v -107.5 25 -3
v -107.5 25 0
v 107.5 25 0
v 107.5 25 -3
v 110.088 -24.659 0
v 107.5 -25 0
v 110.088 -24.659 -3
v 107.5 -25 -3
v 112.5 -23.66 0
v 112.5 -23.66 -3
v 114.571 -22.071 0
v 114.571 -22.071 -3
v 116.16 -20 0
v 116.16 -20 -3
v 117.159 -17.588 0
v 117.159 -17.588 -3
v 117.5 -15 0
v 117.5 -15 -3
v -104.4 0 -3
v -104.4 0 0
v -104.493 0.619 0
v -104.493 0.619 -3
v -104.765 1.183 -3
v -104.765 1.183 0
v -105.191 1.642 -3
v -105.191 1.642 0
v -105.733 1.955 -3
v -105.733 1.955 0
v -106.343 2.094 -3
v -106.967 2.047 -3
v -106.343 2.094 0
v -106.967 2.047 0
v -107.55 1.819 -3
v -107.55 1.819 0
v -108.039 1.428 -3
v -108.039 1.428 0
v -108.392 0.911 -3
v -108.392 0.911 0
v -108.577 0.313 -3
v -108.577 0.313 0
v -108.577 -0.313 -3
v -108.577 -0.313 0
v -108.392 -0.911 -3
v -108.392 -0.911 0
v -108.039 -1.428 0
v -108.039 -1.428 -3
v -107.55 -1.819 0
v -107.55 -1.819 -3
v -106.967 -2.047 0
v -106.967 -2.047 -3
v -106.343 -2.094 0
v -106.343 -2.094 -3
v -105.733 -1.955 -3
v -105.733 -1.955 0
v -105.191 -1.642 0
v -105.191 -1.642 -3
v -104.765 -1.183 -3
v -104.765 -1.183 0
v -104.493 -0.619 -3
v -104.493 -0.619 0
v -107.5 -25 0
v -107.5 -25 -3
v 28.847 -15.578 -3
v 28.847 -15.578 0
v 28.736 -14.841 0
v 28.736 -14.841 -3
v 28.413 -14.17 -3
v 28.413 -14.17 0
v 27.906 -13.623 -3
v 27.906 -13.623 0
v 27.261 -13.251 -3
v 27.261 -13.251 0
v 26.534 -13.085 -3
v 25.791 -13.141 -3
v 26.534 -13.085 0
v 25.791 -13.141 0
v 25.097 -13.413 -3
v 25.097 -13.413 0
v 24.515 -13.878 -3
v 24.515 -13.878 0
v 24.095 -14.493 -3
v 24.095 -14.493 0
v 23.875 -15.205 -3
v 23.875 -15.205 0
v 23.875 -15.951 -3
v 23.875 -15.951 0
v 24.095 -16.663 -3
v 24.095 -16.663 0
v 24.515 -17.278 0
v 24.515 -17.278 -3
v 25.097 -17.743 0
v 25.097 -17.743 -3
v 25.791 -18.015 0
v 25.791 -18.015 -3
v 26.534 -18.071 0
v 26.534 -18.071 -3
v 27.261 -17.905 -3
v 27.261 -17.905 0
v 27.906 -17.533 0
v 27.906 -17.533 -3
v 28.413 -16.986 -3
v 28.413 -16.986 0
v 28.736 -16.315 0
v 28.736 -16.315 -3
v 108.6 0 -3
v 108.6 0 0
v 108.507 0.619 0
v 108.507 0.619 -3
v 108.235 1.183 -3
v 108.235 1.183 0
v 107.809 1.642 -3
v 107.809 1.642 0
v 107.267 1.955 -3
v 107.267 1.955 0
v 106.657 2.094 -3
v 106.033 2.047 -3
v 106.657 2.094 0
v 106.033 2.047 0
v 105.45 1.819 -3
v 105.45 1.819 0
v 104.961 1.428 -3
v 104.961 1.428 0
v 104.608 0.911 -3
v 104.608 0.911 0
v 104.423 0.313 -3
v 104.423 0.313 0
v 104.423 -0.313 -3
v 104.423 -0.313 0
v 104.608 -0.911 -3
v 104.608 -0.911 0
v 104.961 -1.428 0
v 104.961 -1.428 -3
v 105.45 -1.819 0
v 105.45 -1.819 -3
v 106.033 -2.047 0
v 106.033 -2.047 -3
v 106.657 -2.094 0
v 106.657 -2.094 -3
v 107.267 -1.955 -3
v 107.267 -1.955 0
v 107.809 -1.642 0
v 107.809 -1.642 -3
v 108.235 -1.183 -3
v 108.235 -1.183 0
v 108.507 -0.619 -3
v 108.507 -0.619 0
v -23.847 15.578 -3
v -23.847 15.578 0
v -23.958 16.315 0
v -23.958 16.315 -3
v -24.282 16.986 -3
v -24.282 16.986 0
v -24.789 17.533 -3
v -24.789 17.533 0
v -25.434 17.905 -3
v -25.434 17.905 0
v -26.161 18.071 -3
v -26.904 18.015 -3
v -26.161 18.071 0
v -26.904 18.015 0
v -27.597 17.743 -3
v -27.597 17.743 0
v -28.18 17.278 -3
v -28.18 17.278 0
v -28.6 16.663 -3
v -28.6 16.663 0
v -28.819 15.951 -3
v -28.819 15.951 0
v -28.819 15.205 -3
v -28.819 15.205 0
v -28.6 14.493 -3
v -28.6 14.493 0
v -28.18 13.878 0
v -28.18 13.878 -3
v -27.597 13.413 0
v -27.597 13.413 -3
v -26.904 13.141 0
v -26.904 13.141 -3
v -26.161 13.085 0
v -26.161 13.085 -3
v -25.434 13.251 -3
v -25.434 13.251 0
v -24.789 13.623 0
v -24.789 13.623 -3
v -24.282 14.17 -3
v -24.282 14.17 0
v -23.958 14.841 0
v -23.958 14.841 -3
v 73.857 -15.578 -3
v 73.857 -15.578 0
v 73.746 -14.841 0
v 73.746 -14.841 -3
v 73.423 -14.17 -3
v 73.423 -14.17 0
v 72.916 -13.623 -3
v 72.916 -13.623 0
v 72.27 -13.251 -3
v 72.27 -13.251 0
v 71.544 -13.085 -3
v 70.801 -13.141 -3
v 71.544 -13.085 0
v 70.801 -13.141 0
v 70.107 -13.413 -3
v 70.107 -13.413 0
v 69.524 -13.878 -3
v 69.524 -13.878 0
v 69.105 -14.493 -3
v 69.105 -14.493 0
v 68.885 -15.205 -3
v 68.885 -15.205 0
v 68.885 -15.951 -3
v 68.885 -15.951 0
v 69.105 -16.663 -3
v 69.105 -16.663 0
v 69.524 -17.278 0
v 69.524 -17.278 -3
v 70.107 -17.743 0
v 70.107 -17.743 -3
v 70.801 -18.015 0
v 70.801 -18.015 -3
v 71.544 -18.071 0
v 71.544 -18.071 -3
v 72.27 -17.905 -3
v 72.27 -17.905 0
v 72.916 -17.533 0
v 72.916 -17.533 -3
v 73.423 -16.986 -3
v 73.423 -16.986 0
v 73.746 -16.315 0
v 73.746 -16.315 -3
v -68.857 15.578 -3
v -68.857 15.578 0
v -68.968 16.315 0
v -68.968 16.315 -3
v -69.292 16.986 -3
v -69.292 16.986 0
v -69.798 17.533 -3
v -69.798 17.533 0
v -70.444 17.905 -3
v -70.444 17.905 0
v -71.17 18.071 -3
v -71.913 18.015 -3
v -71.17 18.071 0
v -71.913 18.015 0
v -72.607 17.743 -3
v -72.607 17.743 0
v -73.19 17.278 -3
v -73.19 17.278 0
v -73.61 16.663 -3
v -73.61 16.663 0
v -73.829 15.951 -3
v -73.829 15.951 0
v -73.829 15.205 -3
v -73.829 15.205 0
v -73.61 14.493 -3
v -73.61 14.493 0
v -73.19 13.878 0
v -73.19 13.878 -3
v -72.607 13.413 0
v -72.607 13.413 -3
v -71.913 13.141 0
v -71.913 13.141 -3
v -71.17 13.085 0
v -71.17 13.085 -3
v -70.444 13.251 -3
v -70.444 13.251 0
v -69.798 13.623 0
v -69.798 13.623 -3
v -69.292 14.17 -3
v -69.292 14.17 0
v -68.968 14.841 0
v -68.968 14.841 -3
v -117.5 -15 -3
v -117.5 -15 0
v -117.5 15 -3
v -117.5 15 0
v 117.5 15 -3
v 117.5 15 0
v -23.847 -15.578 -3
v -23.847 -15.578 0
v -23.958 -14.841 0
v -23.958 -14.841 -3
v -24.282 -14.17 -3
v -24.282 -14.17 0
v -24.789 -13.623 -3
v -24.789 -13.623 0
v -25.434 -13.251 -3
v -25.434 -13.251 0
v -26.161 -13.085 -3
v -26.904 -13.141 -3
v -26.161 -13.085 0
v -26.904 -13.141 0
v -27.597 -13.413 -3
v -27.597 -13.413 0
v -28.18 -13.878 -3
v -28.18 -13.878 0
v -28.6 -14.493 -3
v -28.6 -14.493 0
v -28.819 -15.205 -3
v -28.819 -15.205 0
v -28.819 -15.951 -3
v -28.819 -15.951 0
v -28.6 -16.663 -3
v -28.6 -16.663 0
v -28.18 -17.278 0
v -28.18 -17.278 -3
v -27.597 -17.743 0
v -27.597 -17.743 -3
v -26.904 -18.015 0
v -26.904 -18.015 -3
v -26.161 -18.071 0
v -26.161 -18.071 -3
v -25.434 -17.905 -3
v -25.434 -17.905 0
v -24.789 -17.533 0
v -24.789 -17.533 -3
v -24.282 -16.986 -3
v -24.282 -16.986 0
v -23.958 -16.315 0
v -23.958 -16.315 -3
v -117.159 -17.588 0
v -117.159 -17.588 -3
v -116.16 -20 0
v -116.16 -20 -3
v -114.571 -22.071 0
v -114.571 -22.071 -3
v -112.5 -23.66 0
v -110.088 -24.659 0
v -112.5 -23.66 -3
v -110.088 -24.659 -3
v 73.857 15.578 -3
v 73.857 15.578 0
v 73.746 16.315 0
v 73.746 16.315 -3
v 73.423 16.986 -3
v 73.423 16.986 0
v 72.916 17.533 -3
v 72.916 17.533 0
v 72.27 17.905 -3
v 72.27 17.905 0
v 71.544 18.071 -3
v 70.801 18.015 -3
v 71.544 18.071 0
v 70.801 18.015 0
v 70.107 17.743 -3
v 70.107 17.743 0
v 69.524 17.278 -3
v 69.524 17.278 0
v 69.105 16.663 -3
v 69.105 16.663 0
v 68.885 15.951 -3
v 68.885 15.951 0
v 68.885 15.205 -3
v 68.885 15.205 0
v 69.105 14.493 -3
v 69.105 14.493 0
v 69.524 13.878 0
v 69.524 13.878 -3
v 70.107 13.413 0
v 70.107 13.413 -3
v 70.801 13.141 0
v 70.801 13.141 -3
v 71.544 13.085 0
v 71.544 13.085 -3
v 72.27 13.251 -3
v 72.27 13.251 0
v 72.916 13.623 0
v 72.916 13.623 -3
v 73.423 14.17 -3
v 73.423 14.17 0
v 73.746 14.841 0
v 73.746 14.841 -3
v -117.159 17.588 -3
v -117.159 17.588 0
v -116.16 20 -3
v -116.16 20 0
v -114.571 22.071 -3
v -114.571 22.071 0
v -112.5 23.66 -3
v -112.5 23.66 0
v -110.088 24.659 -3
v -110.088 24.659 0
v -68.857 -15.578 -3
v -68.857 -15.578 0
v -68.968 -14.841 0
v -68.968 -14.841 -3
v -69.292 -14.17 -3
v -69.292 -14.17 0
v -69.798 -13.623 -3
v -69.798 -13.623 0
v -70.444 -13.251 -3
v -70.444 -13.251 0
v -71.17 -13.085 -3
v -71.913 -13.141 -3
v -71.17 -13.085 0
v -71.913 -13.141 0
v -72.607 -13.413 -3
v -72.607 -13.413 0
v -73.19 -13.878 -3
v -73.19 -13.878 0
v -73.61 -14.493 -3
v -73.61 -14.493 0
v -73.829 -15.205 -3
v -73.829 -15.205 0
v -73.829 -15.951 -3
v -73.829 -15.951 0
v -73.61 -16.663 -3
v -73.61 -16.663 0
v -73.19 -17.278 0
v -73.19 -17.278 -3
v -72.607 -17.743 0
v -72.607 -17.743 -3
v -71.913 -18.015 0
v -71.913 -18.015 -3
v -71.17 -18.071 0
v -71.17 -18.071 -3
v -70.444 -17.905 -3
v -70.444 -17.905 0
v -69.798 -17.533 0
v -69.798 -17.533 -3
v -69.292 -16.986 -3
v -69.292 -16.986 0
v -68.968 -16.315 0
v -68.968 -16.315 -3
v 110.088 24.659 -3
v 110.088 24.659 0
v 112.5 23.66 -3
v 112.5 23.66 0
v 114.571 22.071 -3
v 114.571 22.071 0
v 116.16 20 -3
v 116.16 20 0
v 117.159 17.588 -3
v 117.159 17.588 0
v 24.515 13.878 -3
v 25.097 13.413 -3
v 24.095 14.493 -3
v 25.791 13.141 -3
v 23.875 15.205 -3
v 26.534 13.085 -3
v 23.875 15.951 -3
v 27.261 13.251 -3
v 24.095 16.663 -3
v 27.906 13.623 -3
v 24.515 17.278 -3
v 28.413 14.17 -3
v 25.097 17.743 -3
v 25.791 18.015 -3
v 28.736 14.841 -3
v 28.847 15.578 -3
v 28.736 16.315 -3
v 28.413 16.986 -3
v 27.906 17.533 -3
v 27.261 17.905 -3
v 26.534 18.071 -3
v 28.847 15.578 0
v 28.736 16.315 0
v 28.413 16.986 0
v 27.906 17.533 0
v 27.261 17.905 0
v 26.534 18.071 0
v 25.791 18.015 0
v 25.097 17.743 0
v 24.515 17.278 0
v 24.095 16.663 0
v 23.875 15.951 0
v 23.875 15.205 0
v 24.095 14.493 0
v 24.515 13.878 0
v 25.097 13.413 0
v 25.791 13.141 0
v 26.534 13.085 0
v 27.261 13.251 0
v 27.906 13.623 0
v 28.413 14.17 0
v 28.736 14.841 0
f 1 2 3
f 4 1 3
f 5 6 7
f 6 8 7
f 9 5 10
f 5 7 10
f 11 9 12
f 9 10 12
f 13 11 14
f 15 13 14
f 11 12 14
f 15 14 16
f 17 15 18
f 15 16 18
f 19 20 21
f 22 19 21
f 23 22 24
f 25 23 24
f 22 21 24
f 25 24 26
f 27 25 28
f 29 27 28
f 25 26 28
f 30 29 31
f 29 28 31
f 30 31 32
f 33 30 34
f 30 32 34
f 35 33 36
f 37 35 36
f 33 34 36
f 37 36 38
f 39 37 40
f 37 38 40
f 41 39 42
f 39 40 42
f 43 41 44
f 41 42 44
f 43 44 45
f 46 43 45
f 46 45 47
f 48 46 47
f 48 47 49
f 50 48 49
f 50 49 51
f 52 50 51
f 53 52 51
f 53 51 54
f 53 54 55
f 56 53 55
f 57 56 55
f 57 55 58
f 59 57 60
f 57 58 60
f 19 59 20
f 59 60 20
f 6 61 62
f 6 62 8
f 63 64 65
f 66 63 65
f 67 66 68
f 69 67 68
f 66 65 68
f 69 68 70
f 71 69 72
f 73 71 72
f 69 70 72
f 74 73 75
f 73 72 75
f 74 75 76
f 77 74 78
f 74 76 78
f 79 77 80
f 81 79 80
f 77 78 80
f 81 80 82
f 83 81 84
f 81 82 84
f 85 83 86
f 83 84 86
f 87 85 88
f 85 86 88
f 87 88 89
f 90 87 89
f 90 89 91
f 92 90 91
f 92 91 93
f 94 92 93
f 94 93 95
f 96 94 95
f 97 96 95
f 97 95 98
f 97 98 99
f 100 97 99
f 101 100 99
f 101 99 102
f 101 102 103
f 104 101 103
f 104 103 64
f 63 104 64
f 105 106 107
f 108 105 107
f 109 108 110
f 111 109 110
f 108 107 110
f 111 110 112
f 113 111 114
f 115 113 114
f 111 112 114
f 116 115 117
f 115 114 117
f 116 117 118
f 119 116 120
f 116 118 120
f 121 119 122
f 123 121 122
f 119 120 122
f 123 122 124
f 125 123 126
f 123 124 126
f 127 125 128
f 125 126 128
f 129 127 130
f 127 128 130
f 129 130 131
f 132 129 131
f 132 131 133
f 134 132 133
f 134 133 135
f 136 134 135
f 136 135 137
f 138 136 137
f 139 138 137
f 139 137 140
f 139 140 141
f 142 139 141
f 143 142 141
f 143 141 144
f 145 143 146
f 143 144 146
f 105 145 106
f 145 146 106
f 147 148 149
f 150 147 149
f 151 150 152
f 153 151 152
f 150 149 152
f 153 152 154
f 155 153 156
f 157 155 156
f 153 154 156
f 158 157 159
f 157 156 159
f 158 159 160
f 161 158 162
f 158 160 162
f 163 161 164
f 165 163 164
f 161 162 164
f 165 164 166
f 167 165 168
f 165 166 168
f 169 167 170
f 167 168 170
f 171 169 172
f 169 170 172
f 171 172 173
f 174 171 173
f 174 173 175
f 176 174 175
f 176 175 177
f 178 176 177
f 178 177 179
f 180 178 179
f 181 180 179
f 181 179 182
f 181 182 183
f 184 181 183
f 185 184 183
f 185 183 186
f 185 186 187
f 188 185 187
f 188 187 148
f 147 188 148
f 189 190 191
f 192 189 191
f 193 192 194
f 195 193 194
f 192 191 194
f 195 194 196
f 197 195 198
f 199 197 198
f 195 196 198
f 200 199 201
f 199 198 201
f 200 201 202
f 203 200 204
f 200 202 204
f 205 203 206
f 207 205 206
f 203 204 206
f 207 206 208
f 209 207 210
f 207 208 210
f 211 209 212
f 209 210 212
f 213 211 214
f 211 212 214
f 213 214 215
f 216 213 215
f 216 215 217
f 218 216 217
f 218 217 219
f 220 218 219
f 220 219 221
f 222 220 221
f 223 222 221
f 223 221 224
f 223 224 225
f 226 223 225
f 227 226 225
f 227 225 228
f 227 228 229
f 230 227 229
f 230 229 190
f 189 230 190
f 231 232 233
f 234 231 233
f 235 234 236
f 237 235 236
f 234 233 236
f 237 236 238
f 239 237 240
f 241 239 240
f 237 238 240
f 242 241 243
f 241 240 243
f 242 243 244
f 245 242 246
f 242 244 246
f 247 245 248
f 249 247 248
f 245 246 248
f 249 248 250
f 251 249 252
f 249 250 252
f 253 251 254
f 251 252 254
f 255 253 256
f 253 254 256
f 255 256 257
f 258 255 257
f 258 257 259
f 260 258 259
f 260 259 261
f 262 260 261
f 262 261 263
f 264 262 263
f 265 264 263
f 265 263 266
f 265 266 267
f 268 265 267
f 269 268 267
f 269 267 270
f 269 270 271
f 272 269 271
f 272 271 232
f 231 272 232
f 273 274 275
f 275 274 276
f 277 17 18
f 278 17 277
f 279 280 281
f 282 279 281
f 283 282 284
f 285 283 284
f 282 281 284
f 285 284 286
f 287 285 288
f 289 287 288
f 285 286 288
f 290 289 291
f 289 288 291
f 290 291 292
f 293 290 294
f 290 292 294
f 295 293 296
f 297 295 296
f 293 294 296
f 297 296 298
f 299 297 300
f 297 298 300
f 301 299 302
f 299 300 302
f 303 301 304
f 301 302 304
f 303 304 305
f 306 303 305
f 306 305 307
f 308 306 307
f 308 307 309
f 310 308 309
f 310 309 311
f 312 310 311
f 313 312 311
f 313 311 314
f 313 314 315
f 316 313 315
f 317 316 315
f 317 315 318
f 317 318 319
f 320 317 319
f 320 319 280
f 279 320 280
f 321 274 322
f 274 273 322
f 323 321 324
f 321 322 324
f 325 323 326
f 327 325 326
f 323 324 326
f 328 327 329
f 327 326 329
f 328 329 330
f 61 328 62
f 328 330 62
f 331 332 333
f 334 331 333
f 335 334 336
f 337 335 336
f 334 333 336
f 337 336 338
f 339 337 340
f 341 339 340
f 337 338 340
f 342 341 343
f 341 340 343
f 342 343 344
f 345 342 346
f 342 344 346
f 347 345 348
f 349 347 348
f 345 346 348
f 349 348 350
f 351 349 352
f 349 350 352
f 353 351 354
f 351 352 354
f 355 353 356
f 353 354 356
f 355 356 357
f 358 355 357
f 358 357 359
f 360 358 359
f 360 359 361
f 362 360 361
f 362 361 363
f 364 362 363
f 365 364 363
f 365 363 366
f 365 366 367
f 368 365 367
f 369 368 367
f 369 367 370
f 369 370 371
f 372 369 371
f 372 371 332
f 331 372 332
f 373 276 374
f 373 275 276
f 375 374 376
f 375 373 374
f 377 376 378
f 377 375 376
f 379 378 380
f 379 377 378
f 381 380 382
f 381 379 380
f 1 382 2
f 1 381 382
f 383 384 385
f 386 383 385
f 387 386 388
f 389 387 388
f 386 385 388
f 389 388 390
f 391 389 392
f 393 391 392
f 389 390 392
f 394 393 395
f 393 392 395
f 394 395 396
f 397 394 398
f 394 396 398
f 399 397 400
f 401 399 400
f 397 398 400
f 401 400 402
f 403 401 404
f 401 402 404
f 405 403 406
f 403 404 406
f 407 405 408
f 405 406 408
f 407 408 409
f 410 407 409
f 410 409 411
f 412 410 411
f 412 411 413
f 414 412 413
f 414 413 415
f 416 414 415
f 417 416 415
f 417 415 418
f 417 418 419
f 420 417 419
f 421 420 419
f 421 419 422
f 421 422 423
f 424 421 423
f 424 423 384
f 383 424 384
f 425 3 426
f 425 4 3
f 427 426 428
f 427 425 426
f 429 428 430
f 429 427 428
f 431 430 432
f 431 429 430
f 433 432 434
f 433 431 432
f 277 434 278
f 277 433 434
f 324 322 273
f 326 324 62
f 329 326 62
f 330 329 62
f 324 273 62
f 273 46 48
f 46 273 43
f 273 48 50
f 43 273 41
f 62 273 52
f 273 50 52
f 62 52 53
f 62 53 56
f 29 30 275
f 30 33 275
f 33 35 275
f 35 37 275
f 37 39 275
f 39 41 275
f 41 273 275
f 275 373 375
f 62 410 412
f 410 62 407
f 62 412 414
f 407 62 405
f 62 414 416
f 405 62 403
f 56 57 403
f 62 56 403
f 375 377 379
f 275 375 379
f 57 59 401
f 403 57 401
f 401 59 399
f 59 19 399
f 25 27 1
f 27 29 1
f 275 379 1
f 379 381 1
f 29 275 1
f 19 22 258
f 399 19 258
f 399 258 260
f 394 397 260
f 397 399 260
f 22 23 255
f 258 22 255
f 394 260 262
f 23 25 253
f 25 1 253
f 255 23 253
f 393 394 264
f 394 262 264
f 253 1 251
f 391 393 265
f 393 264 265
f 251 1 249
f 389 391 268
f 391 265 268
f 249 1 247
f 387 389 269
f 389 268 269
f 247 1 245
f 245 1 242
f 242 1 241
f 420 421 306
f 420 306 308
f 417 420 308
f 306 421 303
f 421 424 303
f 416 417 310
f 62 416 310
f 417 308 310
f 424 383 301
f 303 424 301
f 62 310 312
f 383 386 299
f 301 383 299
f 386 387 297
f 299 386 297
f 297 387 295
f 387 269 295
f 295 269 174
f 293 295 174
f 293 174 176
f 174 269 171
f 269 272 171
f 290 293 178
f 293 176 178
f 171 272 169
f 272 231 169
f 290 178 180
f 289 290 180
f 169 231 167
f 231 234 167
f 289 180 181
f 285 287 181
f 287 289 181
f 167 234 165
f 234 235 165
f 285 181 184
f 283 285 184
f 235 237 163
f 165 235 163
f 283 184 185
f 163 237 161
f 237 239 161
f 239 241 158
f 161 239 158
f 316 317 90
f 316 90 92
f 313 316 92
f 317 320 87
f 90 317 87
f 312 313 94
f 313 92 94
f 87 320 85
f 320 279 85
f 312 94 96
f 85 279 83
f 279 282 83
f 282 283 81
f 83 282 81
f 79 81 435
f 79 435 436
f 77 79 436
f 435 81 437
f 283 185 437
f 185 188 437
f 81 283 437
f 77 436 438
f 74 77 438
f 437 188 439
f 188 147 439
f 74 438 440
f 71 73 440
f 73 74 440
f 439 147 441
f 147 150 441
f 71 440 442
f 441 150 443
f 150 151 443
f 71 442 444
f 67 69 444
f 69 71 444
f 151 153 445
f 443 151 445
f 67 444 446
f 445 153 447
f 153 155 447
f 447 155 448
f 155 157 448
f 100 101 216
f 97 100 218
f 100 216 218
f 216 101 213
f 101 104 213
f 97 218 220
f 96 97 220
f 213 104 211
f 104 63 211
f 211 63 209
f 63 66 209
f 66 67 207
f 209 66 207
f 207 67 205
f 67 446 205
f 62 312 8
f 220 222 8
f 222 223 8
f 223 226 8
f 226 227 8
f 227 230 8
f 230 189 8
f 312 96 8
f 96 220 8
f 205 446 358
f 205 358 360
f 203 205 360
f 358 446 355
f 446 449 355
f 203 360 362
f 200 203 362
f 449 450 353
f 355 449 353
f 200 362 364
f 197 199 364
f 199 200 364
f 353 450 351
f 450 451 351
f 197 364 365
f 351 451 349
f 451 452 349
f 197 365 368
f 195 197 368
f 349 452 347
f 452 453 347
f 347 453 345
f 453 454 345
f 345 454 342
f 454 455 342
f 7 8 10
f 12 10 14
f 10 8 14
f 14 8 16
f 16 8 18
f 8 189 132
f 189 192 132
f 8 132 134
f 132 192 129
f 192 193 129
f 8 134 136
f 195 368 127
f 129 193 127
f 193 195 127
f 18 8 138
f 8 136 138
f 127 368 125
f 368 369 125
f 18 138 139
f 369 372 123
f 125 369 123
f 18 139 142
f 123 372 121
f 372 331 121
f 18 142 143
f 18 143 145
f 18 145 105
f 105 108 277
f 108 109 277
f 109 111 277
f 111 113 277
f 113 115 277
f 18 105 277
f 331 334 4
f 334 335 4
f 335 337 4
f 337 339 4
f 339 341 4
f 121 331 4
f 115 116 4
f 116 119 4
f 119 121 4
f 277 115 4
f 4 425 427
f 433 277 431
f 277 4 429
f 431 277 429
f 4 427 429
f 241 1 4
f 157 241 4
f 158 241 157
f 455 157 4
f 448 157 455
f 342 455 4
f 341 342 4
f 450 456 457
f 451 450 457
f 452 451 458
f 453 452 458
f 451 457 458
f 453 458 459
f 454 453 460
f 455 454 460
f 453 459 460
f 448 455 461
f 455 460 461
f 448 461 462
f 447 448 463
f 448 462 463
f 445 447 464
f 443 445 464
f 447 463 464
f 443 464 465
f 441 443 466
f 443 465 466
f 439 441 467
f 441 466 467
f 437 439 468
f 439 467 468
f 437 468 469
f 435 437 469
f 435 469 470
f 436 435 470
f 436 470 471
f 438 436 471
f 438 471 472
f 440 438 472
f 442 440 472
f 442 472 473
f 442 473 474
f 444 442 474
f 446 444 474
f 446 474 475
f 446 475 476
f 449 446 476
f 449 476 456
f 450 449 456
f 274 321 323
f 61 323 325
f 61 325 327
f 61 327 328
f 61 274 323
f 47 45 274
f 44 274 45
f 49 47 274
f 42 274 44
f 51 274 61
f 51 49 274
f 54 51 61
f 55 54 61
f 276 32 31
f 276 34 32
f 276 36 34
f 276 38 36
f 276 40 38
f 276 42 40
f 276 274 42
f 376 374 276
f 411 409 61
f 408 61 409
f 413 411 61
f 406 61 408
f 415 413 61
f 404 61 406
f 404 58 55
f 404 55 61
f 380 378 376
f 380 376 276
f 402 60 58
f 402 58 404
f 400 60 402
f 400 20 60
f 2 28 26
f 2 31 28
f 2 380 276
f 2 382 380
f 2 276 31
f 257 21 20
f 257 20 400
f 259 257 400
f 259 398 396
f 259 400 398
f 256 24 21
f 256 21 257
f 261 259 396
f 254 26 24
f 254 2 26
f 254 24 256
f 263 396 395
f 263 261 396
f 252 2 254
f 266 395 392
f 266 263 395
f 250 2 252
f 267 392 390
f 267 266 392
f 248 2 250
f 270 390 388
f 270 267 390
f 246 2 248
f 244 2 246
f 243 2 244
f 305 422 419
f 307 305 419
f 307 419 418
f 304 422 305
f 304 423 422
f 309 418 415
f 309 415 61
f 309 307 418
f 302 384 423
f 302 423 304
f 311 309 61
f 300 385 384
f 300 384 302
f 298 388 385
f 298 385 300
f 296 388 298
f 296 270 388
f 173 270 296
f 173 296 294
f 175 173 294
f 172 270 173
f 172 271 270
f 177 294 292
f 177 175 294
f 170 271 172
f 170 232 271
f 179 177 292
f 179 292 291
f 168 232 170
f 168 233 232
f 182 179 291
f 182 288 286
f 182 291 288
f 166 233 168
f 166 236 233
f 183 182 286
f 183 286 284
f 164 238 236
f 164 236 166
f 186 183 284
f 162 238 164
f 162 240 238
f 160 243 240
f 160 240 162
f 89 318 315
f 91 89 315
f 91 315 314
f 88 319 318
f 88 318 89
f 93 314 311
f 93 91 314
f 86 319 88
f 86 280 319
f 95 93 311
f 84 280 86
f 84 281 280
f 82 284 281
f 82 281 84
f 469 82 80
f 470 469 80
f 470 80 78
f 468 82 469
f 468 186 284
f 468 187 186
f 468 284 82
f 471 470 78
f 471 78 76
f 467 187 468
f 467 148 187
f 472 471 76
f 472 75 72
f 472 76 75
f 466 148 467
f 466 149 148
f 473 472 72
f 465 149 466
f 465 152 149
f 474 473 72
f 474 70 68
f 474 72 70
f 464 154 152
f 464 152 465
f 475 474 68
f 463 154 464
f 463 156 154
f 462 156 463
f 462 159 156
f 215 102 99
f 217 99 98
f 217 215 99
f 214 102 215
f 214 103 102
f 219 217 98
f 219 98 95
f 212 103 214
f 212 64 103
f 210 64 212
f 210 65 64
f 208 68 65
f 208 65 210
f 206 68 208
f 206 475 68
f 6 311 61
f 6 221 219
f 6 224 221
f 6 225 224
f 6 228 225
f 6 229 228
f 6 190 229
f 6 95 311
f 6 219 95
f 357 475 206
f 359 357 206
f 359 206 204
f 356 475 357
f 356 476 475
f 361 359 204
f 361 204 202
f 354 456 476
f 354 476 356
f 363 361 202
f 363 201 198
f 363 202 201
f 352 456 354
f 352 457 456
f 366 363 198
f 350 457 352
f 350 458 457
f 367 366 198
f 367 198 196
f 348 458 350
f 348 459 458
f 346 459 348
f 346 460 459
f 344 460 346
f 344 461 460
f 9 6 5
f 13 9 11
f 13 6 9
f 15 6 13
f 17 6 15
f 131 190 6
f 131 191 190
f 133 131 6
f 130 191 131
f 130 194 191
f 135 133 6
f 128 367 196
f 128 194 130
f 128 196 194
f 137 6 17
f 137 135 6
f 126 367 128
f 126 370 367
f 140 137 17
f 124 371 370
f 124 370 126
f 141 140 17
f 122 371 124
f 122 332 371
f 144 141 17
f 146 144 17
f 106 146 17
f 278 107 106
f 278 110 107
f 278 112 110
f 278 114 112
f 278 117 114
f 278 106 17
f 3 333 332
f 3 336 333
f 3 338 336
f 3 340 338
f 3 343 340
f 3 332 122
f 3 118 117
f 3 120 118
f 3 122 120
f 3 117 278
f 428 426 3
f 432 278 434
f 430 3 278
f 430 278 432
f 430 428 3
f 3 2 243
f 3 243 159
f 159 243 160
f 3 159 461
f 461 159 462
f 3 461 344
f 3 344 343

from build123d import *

# Parameters (mm, degrees)
F0_W     = 235
F0_H     = 50
F0_R     = 2.1
F1_DEPTH = 3
F2_R     = 10
F3_R     = 2.5
F4_DEPTH = 3.001


with BuildPart() as f1:
    # F0 (on Top) → F1 (new body)
    with BuildSketch(Plane.XY):
        Rectangle(F0_W, F0_H)
        with Locations((-106.5, 0)):
            Circle(F0_R, mode=Mode.SUBTRACT)
        with Locations((106.5, 0)):
            Circle(F0_R, mode=Mode.SUBTRACT)
    extrude(amount=-F1_DEPTH)

    # F2
    f2_edges = [f1.edges().sort_by_distance(p)[0] for p in [
        (117.5, 25, -1.5),
        (117.5, -25, -1.5),
        (-117.5, -25, -1.5),
        (-117.5, 25, -1.5),
    ]]
    fillet(f2_edges, radius=F2_R)

    # F3 (on face) → F4 (cut, through all)
    with BuildSketch(Plane.XY):
        with Locations((-71.357113, 15.577964)):
            Circle(F3_R)
        with Locations((-26.3474, 15.577964)):
            Circle(F3_R)
        with Locations((71.357113, 15.577964)):
            Circle(F3_R)
        with Locations((26.3474, 15.577964)):
            Circle(F3_R)
        with Locations((71.357113, -15.577964)):
            Circle(F3_R)
        with Locations((-26.3474, -15.577964)):
            Circle(F3_R)
        with Locations((-71.357113, -15.577964)):
            Circle(F3_R)
        with Locations((26.3474, -15.577964)):
            Circle(F3_R)
    extrude(amount=-F4_DEPTH, mode=Mode.SUBTRACT)


solid = f1.part
